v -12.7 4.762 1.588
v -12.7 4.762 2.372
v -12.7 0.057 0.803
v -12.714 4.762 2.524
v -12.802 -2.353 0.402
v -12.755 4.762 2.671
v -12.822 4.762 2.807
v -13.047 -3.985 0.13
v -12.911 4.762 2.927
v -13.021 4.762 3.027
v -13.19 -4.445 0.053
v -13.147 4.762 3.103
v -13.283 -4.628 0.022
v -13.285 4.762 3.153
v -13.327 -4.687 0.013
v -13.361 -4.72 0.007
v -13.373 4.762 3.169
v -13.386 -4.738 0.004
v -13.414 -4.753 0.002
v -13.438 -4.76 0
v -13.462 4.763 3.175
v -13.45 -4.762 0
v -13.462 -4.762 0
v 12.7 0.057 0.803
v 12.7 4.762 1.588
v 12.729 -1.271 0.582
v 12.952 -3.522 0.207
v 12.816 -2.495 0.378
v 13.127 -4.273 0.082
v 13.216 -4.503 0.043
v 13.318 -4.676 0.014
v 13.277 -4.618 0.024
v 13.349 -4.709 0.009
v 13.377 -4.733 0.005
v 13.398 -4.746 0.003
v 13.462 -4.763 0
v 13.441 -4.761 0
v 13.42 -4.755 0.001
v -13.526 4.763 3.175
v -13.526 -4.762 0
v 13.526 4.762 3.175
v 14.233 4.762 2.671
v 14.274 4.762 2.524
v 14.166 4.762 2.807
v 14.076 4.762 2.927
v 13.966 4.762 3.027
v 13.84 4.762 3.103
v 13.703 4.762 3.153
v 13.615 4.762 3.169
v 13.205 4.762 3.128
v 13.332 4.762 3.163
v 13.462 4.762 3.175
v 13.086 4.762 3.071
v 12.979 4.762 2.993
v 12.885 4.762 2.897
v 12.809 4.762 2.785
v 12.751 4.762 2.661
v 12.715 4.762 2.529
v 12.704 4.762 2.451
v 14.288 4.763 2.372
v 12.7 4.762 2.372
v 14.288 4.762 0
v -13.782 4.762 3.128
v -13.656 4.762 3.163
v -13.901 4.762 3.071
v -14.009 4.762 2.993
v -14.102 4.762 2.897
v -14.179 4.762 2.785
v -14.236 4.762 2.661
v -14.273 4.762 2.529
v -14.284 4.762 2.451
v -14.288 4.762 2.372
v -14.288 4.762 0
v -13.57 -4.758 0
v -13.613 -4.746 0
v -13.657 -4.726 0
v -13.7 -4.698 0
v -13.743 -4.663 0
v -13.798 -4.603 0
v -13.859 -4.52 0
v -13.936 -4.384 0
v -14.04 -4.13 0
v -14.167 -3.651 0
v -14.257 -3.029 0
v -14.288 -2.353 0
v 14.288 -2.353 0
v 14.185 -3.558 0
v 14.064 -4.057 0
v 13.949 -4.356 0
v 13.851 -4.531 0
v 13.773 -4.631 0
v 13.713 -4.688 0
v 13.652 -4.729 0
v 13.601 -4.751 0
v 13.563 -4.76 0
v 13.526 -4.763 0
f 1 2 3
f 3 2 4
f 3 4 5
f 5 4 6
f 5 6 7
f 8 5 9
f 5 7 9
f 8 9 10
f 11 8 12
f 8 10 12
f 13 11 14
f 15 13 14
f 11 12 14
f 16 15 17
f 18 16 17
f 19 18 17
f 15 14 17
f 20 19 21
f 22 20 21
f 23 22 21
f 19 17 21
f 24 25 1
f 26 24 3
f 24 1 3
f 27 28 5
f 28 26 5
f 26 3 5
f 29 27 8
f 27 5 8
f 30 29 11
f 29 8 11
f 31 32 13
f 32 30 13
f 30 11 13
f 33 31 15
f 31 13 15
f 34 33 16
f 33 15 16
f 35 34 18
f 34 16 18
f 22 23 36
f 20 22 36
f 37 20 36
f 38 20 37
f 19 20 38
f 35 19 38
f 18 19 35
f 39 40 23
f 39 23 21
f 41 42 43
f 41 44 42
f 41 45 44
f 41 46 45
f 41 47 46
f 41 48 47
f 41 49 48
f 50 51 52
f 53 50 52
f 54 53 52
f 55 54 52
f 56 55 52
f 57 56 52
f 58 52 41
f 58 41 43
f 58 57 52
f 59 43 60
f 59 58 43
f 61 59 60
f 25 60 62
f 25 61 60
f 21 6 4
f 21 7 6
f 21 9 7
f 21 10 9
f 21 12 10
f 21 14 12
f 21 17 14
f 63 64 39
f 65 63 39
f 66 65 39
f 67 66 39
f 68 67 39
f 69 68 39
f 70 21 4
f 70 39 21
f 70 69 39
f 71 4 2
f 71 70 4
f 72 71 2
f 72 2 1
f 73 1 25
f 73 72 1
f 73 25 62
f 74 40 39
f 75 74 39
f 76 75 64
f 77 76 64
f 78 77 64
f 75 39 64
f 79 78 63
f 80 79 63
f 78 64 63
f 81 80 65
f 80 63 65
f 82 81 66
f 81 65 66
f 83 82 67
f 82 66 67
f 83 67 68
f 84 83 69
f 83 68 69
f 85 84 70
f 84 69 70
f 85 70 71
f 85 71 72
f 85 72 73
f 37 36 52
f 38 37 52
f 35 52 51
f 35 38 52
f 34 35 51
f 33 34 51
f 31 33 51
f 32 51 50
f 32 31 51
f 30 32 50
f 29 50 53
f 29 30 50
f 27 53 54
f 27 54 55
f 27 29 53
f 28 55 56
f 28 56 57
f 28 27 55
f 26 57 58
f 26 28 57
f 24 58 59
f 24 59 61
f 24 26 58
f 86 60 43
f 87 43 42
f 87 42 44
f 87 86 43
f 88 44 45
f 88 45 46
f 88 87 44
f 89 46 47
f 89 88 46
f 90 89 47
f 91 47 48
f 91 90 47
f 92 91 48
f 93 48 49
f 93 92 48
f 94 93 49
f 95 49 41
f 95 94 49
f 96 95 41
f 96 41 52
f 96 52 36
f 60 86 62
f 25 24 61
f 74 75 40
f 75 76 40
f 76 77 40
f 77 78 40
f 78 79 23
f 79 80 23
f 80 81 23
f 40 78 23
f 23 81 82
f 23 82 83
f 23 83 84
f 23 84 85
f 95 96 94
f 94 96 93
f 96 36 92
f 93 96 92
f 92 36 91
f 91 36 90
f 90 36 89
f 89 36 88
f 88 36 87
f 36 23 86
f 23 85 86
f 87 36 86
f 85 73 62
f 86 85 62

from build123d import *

# Parameters (mm, degrees)
F0_W     = 28.575
F0_H     = 9.525
F1_DEPTH = 1.5875
F3_DEPTH = 28.575
F5_DEPTH = 1.5875
F7_DEPTH = 1.5875
F8_R     = 0.762


with BuildPart() as f1:
    # F0 (on Top) → F1 (new body)
    with BuildSketch(Plane.XY):
        Rectangle(F0_W, F0_H)
    extrude(amount=F1_DEPTH)

    # F2 (on face) → F3 (cut, through all)
    with BuildSketch(Plane(origin=(-14.2875, 0, 0), x_dir=(0, -1, 0), z_dir=(-1, 0, 0))):
        Polygon((4.7625, 1.5875), (-4.7625, 1.5875), (4.7625, 0), align=None)
    extrude(amount=-F3_DEPTH, mode=Mode.SUBTRACT)

    # F4 (on face) → F5 (join)
    with BuildSketch(Plane(origin=(-14.2875, 0, 0), x_dir=(0, -1, 0), z_dir=(-1, 0, 0))):
        Polygon((-4.7625, 3.175), (-4.7625, 0), (4.7625, 0), align=None)
    extrude(amount=-F5_DEPTH)

    # F6 (on face) → F7 (join)
    with BuildSketch(Plane.YZ.offset(14.2875)):
        Polygon((-4.7625, 0), (4.7625, 0), (4.7625, 3.175), align=None)
    extrude(amount=-F7_DEPTH)

    # F8
    f8_edges = [f1.edges().sort_by_distance(p)[0] for p in [
        (-14.2875, 0, 1.5875),
        (-12.7, 0, 1.5875),
        (12.7, 0, 1.5875),
        (14.2875, 0, 1.5875),
    ]]
    fillet(f8_edges, radius=F8_R)


solid = f1.part
